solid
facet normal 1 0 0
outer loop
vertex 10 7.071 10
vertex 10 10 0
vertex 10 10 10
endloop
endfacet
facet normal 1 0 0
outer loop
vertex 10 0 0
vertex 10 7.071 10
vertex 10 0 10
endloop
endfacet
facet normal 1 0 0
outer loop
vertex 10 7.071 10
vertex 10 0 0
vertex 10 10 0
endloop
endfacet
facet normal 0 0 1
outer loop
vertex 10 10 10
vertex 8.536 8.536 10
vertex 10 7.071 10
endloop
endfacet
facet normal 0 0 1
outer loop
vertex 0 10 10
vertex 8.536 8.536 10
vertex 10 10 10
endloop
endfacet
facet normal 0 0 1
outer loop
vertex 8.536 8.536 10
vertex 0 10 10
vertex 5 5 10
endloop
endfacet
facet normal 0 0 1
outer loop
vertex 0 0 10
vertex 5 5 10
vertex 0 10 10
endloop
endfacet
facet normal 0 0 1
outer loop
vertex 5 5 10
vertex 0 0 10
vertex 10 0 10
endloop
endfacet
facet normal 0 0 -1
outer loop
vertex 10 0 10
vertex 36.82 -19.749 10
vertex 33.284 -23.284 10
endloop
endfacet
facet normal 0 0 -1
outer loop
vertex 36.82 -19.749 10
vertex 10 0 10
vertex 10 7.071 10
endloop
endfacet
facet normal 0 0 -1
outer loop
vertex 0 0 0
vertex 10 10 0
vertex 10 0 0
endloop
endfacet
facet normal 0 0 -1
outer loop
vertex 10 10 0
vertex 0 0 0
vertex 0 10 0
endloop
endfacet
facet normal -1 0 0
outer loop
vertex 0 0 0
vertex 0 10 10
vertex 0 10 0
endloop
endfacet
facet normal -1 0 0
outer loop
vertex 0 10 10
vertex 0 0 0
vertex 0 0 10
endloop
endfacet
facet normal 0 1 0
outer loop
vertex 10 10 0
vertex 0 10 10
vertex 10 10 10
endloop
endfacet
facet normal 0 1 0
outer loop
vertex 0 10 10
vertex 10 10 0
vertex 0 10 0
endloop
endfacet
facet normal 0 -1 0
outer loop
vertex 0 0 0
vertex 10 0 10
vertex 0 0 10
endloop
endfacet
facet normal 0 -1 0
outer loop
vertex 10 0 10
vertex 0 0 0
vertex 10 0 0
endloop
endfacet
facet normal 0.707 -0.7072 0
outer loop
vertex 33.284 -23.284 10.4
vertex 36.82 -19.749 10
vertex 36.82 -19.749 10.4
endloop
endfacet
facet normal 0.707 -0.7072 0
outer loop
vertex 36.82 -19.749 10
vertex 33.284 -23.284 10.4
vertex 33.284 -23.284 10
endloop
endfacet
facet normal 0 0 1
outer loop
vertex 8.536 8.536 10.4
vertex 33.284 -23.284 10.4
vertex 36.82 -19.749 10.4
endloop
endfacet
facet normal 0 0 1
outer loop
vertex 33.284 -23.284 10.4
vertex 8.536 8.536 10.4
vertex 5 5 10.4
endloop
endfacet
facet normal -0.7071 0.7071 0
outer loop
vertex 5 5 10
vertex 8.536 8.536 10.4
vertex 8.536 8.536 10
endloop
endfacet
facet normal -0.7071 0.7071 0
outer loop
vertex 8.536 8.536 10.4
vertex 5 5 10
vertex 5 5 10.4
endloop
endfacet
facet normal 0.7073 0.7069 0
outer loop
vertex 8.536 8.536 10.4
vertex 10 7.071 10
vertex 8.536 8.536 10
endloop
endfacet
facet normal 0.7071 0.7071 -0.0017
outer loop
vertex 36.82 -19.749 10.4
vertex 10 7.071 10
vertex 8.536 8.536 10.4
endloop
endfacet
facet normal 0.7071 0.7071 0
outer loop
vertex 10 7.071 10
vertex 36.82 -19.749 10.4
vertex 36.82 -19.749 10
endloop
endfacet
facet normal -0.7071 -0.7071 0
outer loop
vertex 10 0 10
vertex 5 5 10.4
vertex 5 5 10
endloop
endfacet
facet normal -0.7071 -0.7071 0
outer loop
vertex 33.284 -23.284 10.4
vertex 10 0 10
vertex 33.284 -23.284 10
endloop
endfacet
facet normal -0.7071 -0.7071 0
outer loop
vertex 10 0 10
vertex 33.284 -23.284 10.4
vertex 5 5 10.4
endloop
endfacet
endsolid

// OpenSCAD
// file: local.scad
//a few utility functions
function norm(a) = sqrt(a*a);
function unit_vector(v) = v/norm(v);
function clamp(v,lower_bound,upper_bound) = min(max(v,lower_bound),upper_bound);
function cross_product(a,b) = [
	a[1]*b[2]-a[2]*b[1],
	a[2]*b[0]-a[0]*b[2],
	a[0]*b[1]-a[1]*b[0]
];

//works for both numbers and vectors
function almost_equal(number, ref, tol) = sqrt((number-ref)*(number-ref)) < tol;

function _rotation_angle(a,b) = (a*b > 0) ? 
	asin(clamp(norm(cross_product(b,a))/norm(a)/norm(b),-1,1)) :
	180 - asin(clamp(norm(cross_product(b,a))/norm(a)/norm(b),-1,1));

//The (non-unit) rotation axis and angle around which a has to be rotated to be colinear to b
function calculate_rotation_axis(a,b) =
	//if the two vectors are not colinear find a rotation axis using the cross product
	(norm(cross_product(b,a)) != 0) ? [unit_vector(cross_product(b,a)),_rotation_angle(a,b)] :
	//if they are colinear and do not lie in the yz plane, choose the rotation axis from the yz plane
	(a*[1,0,0] < 0) ? [unit_vector([0,-a[1],+a[0]]),acos(clamp(a*b/norm(a)/norm(b),-1,1))] :
	(a*[1,0,0] > 0) ? [unit_vector([0,+a[1],-a[0]]),acos(clamp(a*b/norm(a)/norm(b),-1,1))] :
	//otherwise use the x axis
	[[1,0,0],acos(clamp(a*b/norm(a)/norm(b),-1,1))];

function calculate_axes(x,y) = [unit_vector(x),unit_vector(y), unit_vector(cross_product(x,y))];

function new_cs(origin=[0,0,0],axes=[[1,0,0],[0,1,0],[0,0,1]]) = (len(axes) == 2) ?
	[origin,calculate_axes(axes[0],axes[1])] :
	is_orthonormal([origin,axes]) ?
		[origin,axes] :
		"Error: Axes are not orthonormal";

function is_orthonormal(cs,tol=1e-3) =
	(almost_equal(norm(cs[1][0]),1,tol)) &&
	(almost_equal(norm(cs[1][1]),1,tol)) &&
	(almost_equal(norm(cs[1][2]),1,tol)) &&
	(almost_equal(cross_product(cs[1][0],cs[1][1]),cs[1][2],tol)) &&
	(almost_equal(cross_product(cs[1][1],cs[1][2]),cs[1][0],tol)) &&
	(almost_equal(cross_product(cs[1][2],cs[1][0]),cs[1][1],tol));

function unit_matrix3() = [
[1,0,0],
[0,1,0],
[0,0,1]];

function tensor_product_matrix3(u,v) = [
[u[0]*v[0], u[0]*v[1], u[0]*v[2]],
[u[1]*v[0], u[1]*v[1], u[1]*v[2]],
[u[2]*v[0], u[2]*v[1], u[2]*v[2]]];

function cross_product_matrix3(v) = [
[   0 , -v[2], +v[1]],
[+v[2],    0 , -v[0]],
[-v[1],  v[0],    0 ]];

function rotation_matrix3(n,angle) =
	cos(angle)*unit_matrix3() +
	sin(angle)*cross_product_matrix3(n) +
	(1-cos(angle))*tensor_product_matrix3(n,n);

//the modules are used directly by the user
module show_cs(cs){
	origin = cs[0];
	axes = cs[1];
	x_rot = calculate_rotation_axis(axes[0],[0,0,1]);
	y_rot = calculate_rotation_axis(axes[1],[0,0,1]);
	z_rot = calculate_rotation_axis(axes[2],[0,0,1]);
	translate(origin){
		color("Gray") sphere(0.2);
		rotate(x_rot[1],x_rot[0]) color("Red") cylinder(r=0.1,h=norm(axes[0]));
		rotate(y_rot[1],y_rot[0]) color("Green") cylinder(r=0.1,h=norm(axes[1]));
		rotate(z_rot[1],z_rot[0]) color("Blue") cylinder(r=0.1,h=norm(axes[2]));
	}
}

module translate_local(cs,v=[0,0,0]){
	origin = cs[0];
	axes = cs[1];
	x_rot = calculate_rotation_axis(axes[0],[1,0,0]);
	y_rot = calculate_rotation_axis(axes[1],
		rotation_matrix3(x_rot[0],x_rot[1])*[0,1,0]);
	translate(origin+v*axes){
		//align y axes
		rotate(y_rot[1],y_rot[0]){
			//align x axes
			rotate(x_rot[1],x_rot[0]){
				child(0);
			}
		}
	}
}

module in_cs(cs){
	origin = cs[0];
	axes = cs[1];
	x_rot = calculate_rotation_axis(axes[0],[1,0,0]);
	y_rot = calculate_rotation_axis(axes[1],
		rotation_matrix3(x_rot[0],x_rot[1])*[0,1,0]);
	translate(origin){
		//align y axes
		rotate(y_rot[1],y_rot[0]){
			//align x axes
			rotate(x_rot[1],x_rot[0]){
				child(0);
			}
		}
	}
}

module align(cs, cs_dst, displacement){
	x_rot = calculate_rotation_axis(cs[1][0],cs_dst[1][0]);
	y_rot = _rotation_angle(cs[1][1],
		rotation_matrix3(x_rot[0],x_rot[1])*cs_dst[1][1]);
	echo(y_rot);
	translate(cs_dst[0])
		//align y axes
		rotate(-y_rot,cs[1][0])
			//align x axes
			rotate(x_rot[1],x_rot[0])
				translate(-cs[0]+displacement)
					child(0);
}
// main file
use <local.scad>

//make modularity simple
//coordinate systems are pretty close to the connectors from attach.scad:
//https://github.com/Obijuan/obiscad
//http://www.thingiverse.com/thing:30136
//so we can use them as such

//define bodies with corresponding coordinate systems to define attachment
//points
module cube1(){
	cube([10,10,10]);
}
cube1_1 = new_cs(origin=[5,5,10],axes =calculate_axes([0,0,1],[1,0,0]));

module arm(){
	cube([40,5,0.4]);
}

arm_1 = new_cs([5,2.5,0],axes=calculate_axes([0,0,1],[1,1,0]));

//cube1();
//show_cs(cube1_1);

//arm();
//show_cs(arm_1);

//align moves the child in such a way that the first coordinate system
//coincides with the second, and thereby attaches the arm to the cube
cube1();
align(arm_1,cube1_1) arm();
